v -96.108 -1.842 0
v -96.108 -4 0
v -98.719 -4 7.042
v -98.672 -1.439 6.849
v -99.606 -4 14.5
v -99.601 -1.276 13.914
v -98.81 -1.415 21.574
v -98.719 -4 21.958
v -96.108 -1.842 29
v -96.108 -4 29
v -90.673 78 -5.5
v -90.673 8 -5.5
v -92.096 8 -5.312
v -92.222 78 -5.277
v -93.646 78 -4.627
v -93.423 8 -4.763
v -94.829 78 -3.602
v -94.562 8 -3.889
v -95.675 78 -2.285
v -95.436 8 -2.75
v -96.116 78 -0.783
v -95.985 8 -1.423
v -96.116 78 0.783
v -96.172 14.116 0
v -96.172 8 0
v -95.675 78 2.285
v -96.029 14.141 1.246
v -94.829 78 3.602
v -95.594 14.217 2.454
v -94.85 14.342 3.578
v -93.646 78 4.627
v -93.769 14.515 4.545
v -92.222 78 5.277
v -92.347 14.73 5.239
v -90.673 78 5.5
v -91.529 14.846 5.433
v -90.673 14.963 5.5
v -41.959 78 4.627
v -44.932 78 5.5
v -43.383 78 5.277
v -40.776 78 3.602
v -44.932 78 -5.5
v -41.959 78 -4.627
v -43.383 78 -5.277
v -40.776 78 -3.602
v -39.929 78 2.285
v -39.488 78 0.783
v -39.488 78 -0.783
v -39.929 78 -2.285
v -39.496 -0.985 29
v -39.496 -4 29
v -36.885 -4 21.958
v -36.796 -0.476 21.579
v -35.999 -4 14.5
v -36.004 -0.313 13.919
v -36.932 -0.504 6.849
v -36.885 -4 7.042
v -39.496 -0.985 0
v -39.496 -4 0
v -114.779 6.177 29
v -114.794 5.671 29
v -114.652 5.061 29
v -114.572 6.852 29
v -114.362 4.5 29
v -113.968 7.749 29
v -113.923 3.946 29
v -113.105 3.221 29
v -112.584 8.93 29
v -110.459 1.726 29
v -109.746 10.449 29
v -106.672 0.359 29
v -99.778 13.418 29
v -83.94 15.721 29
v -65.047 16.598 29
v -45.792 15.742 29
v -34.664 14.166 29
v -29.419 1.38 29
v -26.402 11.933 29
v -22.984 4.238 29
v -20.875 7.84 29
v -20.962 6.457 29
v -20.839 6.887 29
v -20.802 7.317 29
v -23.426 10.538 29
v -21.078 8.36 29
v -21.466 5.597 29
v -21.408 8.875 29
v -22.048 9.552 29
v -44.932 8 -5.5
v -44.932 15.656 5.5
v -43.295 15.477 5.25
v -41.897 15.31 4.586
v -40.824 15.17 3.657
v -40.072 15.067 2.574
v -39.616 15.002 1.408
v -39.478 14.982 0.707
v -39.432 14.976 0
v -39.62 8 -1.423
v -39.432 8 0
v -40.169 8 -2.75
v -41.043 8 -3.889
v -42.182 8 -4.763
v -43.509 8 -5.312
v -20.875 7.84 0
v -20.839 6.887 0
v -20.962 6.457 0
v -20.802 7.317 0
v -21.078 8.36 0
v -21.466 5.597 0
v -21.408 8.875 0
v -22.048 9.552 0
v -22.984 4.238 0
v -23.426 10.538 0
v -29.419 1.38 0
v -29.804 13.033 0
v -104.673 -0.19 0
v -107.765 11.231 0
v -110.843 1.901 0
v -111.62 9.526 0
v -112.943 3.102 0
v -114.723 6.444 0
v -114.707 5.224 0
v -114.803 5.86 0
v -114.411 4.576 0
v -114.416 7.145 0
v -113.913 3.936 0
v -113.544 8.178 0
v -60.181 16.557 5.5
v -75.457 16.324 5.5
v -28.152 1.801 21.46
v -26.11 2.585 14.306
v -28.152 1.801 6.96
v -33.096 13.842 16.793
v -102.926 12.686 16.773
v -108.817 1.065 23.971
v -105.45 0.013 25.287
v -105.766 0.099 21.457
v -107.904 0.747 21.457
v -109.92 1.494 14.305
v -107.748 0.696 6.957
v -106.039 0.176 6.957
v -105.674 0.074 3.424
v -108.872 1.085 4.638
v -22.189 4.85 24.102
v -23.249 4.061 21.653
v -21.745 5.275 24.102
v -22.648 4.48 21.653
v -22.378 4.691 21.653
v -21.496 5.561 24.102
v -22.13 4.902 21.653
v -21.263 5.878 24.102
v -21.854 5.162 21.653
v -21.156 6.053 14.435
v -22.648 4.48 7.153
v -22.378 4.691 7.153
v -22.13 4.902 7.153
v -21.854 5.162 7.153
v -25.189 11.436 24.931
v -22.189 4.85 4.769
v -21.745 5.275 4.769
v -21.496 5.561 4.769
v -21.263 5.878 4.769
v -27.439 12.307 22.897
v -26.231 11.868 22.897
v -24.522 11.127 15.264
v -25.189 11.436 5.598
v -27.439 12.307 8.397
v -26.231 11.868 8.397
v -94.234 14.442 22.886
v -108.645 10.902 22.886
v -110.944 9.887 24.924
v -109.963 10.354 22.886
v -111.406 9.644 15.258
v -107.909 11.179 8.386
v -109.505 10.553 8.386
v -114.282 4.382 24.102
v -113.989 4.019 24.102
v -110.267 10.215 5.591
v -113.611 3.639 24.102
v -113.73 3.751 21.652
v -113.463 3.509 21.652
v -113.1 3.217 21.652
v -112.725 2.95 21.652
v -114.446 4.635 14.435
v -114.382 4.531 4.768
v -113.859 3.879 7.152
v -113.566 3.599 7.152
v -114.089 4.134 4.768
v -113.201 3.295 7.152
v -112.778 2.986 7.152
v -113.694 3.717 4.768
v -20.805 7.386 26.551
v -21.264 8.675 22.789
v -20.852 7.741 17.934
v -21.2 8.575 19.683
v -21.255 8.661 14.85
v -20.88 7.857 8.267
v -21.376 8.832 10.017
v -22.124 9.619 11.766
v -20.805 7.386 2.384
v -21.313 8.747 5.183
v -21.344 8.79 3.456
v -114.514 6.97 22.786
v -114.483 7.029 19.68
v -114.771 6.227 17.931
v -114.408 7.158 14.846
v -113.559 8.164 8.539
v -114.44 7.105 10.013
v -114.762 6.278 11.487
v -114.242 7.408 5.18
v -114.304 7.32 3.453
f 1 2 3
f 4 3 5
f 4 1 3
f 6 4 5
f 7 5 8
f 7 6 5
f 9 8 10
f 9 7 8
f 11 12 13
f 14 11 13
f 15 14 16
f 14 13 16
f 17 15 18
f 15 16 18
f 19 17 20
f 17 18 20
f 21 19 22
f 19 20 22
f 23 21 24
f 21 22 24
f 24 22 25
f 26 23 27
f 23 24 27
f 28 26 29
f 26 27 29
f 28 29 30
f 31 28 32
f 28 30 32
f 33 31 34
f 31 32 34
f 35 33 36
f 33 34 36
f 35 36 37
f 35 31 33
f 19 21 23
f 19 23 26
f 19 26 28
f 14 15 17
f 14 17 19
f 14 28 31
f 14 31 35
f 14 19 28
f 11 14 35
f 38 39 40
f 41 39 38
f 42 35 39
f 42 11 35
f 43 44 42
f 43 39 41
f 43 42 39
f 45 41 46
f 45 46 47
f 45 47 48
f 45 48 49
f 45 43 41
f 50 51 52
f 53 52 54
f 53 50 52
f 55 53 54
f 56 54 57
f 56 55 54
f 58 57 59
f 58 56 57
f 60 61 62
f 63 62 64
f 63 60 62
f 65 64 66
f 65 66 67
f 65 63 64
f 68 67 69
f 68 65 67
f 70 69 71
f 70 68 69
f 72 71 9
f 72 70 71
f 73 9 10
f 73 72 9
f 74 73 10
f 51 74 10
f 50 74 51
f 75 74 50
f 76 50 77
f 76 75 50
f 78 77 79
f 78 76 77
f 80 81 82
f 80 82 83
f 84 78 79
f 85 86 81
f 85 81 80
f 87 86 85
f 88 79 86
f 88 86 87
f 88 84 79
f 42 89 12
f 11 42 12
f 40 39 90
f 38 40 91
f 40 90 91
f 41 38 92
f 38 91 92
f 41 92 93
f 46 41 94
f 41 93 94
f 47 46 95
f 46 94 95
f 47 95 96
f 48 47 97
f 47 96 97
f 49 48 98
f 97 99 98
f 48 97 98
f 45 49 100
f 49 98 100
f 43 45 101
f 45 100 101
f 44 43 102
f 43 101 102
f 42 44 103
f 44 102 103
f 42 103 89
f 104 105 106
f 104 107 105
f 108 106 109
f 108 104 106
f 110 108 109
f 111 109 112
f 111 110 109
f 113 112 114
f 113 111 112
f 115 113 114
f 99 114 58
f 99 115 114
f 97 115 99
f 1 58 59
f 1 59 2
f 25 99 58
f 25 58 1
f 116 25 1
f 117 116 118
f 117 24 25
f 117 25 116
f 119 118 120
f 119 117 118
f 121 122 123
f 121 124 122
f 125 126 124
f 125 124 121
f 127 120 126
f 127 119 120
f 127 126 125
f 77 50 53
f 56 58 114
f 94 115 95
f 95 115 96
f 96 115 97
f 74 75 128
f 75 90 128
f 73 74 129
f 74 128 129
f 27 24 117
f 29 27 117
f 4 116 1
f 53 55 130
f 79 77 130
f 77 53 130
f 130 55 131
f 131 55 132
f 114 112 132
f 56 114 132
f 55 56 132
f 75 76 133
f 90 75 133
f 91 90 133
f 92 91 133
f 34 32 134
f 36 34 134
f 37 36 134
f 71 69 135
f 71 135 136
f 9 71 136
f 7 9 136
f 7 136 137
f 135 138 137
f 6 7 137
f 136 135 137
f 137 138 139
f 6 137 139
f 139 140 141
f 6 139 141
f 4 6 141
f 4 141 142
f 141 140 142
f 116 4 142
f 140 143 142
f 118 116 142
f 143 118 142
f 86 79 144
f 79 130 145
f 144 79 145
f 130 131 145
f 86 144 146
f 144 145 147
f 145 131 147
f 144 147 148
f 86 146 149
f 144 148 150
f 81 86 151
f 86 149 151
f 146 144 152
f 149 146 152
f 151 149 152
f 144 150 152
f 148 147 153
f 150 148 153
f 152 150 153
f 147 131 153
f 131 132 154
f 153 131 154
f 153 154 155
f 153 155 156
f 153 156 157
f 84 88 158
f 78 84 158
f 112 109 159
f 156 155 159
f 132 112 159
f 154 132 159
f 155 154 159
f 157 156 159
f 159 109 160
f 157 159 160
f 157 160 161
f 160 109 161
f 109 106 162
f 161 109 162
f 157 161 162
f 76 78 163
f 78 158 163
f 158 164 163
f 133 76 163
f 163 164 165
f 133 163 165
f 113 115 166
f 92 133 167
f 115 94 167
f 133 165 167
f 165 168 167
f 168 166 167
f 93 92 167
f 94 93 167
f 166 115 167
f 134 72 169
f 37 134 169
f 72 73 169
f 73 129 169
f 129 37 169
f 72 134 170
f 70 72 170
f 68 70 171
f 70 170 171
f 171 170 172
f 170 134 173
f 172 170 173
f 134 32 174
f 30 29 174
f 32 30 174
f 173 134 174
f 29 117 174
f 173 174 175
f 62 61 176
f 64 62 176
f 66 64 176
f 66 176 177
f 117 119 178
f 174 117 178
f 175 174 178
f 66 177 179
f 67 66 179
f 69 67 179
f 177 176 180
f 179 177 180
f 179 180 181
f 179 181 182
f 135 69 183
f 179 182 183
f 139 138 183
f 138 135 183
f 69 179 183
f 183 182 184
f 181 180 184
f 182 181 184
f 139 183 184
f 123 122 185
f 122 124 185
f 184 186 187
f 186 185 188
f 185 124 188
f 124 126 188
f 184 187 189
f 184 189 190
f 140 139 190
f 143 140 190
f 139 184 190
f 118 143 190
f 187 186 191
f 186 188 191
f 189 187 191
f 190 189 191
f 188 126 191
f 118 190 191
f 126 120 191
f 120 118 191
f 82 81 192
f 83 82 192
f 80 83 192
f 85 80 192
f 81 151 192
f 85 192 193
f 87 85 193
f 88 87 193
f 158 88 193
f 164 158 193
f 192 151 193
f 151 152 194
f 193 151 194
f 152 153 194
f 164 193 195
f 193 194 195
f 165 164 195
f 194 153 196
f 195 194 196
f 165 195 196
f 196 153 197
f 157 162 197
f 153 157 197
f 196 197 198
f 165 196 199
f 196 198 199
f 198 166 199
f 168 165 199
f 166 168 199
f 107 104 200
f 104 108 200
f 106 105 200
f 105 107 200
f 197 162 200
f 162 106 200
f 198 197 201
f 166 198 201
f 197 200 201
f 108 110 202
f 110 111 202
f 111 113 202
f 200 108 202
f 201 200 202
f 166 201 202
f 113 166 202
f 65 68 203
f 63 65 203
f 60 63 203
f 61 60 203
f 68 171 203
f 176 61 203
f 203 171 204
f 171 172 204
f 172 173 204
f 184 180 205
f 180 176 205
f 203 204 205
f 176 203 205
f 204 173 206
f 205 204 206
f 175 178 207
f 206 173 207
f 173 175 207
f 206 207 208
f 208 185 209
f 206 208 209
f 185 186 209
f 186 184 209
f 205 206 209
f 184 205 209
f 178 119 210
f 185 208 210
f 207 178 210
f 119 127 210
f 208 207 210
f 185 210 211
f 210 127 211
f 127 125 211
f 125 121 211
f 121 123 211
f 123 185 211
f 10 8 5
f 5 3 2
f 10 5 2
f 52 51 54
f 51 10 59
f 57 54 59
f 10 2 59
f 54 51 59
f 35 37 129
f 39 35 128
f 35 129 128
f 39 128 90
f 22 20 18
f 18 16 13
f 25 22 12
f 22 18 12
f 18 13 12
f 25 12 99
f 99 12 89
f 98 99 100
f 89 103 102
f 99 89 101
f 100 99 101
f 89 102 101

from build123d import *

# Parameters (mm, degrees)
SKETCH2_RX          = 47.005912867
SKETCH2_RY          = 10.001258057
BOSS_EXTRUDE2_DEPTH = 29
BOSS_EXTRUDE3_DEPTH = 4
BOSS_EXTRUDE4_DEPTH = 70


with BuildPart() as part:
    # Sketch2 → Boss-Extrude2 (new body)
    with BuildSketch(Plane.XY):
        with Locations(Location((-67.802373164, 6.5712636), (0, 0, 0.908793004))):
            Ellipse(SKETCH2_RX, SKETCH2_RY)
    extrude(amount=BOSS_EXTRUDE2_DEPTH)

    # Sketch3 → Boss-Extrude3 (add)
    with BuildSketch(Plane(origin=(0, 0, 0), x_dir=(1, 0, 0), z_dir=(0, 1, 0))):
        with BuildLine():
            Line((-96.108391235, -29), (-39.496355092, -29))
            ThreePointArc((-39.496355092, -29), (-35.998589441, -14.5), (-39.496355092, 0))
            Line((-39.496355092, 0), (-96.108391235, 0))
            ThreePointArc((-96.108391235, 0), (-99.606156886, -14.5), (-96.108391235, -29))
        make_face()
    extrude(amount=-BOSS_EXTRUDE3_DEPTH)

    # Sketch5 → Boss-Extrude4 (add)
    with BuildSketch(Plane(origin=(0, 7.999999876, 0), x_dir=(-1, 0, 0), z_dir=(0, -1, 0))):
        with BuildLine():
            Line((44.932105476, 5.499725114), (90.672640852, 5.499725114))
            ThreePointArc((90.672640852, 5.499725114), (96.172365966, 0), (90.672640852, -5.499725114))
            Line((90.672640852, -5.499725114), (44.932105476, -5.499725114))
            ThreePointArc((44.932105476, -5.499725114), (39.432380362, 0), (44.932105476, 5.499725114))
        make_face()
    extrude(amount=-BOSS_EXTRUDE4_DEPTH)


solid = part.part
